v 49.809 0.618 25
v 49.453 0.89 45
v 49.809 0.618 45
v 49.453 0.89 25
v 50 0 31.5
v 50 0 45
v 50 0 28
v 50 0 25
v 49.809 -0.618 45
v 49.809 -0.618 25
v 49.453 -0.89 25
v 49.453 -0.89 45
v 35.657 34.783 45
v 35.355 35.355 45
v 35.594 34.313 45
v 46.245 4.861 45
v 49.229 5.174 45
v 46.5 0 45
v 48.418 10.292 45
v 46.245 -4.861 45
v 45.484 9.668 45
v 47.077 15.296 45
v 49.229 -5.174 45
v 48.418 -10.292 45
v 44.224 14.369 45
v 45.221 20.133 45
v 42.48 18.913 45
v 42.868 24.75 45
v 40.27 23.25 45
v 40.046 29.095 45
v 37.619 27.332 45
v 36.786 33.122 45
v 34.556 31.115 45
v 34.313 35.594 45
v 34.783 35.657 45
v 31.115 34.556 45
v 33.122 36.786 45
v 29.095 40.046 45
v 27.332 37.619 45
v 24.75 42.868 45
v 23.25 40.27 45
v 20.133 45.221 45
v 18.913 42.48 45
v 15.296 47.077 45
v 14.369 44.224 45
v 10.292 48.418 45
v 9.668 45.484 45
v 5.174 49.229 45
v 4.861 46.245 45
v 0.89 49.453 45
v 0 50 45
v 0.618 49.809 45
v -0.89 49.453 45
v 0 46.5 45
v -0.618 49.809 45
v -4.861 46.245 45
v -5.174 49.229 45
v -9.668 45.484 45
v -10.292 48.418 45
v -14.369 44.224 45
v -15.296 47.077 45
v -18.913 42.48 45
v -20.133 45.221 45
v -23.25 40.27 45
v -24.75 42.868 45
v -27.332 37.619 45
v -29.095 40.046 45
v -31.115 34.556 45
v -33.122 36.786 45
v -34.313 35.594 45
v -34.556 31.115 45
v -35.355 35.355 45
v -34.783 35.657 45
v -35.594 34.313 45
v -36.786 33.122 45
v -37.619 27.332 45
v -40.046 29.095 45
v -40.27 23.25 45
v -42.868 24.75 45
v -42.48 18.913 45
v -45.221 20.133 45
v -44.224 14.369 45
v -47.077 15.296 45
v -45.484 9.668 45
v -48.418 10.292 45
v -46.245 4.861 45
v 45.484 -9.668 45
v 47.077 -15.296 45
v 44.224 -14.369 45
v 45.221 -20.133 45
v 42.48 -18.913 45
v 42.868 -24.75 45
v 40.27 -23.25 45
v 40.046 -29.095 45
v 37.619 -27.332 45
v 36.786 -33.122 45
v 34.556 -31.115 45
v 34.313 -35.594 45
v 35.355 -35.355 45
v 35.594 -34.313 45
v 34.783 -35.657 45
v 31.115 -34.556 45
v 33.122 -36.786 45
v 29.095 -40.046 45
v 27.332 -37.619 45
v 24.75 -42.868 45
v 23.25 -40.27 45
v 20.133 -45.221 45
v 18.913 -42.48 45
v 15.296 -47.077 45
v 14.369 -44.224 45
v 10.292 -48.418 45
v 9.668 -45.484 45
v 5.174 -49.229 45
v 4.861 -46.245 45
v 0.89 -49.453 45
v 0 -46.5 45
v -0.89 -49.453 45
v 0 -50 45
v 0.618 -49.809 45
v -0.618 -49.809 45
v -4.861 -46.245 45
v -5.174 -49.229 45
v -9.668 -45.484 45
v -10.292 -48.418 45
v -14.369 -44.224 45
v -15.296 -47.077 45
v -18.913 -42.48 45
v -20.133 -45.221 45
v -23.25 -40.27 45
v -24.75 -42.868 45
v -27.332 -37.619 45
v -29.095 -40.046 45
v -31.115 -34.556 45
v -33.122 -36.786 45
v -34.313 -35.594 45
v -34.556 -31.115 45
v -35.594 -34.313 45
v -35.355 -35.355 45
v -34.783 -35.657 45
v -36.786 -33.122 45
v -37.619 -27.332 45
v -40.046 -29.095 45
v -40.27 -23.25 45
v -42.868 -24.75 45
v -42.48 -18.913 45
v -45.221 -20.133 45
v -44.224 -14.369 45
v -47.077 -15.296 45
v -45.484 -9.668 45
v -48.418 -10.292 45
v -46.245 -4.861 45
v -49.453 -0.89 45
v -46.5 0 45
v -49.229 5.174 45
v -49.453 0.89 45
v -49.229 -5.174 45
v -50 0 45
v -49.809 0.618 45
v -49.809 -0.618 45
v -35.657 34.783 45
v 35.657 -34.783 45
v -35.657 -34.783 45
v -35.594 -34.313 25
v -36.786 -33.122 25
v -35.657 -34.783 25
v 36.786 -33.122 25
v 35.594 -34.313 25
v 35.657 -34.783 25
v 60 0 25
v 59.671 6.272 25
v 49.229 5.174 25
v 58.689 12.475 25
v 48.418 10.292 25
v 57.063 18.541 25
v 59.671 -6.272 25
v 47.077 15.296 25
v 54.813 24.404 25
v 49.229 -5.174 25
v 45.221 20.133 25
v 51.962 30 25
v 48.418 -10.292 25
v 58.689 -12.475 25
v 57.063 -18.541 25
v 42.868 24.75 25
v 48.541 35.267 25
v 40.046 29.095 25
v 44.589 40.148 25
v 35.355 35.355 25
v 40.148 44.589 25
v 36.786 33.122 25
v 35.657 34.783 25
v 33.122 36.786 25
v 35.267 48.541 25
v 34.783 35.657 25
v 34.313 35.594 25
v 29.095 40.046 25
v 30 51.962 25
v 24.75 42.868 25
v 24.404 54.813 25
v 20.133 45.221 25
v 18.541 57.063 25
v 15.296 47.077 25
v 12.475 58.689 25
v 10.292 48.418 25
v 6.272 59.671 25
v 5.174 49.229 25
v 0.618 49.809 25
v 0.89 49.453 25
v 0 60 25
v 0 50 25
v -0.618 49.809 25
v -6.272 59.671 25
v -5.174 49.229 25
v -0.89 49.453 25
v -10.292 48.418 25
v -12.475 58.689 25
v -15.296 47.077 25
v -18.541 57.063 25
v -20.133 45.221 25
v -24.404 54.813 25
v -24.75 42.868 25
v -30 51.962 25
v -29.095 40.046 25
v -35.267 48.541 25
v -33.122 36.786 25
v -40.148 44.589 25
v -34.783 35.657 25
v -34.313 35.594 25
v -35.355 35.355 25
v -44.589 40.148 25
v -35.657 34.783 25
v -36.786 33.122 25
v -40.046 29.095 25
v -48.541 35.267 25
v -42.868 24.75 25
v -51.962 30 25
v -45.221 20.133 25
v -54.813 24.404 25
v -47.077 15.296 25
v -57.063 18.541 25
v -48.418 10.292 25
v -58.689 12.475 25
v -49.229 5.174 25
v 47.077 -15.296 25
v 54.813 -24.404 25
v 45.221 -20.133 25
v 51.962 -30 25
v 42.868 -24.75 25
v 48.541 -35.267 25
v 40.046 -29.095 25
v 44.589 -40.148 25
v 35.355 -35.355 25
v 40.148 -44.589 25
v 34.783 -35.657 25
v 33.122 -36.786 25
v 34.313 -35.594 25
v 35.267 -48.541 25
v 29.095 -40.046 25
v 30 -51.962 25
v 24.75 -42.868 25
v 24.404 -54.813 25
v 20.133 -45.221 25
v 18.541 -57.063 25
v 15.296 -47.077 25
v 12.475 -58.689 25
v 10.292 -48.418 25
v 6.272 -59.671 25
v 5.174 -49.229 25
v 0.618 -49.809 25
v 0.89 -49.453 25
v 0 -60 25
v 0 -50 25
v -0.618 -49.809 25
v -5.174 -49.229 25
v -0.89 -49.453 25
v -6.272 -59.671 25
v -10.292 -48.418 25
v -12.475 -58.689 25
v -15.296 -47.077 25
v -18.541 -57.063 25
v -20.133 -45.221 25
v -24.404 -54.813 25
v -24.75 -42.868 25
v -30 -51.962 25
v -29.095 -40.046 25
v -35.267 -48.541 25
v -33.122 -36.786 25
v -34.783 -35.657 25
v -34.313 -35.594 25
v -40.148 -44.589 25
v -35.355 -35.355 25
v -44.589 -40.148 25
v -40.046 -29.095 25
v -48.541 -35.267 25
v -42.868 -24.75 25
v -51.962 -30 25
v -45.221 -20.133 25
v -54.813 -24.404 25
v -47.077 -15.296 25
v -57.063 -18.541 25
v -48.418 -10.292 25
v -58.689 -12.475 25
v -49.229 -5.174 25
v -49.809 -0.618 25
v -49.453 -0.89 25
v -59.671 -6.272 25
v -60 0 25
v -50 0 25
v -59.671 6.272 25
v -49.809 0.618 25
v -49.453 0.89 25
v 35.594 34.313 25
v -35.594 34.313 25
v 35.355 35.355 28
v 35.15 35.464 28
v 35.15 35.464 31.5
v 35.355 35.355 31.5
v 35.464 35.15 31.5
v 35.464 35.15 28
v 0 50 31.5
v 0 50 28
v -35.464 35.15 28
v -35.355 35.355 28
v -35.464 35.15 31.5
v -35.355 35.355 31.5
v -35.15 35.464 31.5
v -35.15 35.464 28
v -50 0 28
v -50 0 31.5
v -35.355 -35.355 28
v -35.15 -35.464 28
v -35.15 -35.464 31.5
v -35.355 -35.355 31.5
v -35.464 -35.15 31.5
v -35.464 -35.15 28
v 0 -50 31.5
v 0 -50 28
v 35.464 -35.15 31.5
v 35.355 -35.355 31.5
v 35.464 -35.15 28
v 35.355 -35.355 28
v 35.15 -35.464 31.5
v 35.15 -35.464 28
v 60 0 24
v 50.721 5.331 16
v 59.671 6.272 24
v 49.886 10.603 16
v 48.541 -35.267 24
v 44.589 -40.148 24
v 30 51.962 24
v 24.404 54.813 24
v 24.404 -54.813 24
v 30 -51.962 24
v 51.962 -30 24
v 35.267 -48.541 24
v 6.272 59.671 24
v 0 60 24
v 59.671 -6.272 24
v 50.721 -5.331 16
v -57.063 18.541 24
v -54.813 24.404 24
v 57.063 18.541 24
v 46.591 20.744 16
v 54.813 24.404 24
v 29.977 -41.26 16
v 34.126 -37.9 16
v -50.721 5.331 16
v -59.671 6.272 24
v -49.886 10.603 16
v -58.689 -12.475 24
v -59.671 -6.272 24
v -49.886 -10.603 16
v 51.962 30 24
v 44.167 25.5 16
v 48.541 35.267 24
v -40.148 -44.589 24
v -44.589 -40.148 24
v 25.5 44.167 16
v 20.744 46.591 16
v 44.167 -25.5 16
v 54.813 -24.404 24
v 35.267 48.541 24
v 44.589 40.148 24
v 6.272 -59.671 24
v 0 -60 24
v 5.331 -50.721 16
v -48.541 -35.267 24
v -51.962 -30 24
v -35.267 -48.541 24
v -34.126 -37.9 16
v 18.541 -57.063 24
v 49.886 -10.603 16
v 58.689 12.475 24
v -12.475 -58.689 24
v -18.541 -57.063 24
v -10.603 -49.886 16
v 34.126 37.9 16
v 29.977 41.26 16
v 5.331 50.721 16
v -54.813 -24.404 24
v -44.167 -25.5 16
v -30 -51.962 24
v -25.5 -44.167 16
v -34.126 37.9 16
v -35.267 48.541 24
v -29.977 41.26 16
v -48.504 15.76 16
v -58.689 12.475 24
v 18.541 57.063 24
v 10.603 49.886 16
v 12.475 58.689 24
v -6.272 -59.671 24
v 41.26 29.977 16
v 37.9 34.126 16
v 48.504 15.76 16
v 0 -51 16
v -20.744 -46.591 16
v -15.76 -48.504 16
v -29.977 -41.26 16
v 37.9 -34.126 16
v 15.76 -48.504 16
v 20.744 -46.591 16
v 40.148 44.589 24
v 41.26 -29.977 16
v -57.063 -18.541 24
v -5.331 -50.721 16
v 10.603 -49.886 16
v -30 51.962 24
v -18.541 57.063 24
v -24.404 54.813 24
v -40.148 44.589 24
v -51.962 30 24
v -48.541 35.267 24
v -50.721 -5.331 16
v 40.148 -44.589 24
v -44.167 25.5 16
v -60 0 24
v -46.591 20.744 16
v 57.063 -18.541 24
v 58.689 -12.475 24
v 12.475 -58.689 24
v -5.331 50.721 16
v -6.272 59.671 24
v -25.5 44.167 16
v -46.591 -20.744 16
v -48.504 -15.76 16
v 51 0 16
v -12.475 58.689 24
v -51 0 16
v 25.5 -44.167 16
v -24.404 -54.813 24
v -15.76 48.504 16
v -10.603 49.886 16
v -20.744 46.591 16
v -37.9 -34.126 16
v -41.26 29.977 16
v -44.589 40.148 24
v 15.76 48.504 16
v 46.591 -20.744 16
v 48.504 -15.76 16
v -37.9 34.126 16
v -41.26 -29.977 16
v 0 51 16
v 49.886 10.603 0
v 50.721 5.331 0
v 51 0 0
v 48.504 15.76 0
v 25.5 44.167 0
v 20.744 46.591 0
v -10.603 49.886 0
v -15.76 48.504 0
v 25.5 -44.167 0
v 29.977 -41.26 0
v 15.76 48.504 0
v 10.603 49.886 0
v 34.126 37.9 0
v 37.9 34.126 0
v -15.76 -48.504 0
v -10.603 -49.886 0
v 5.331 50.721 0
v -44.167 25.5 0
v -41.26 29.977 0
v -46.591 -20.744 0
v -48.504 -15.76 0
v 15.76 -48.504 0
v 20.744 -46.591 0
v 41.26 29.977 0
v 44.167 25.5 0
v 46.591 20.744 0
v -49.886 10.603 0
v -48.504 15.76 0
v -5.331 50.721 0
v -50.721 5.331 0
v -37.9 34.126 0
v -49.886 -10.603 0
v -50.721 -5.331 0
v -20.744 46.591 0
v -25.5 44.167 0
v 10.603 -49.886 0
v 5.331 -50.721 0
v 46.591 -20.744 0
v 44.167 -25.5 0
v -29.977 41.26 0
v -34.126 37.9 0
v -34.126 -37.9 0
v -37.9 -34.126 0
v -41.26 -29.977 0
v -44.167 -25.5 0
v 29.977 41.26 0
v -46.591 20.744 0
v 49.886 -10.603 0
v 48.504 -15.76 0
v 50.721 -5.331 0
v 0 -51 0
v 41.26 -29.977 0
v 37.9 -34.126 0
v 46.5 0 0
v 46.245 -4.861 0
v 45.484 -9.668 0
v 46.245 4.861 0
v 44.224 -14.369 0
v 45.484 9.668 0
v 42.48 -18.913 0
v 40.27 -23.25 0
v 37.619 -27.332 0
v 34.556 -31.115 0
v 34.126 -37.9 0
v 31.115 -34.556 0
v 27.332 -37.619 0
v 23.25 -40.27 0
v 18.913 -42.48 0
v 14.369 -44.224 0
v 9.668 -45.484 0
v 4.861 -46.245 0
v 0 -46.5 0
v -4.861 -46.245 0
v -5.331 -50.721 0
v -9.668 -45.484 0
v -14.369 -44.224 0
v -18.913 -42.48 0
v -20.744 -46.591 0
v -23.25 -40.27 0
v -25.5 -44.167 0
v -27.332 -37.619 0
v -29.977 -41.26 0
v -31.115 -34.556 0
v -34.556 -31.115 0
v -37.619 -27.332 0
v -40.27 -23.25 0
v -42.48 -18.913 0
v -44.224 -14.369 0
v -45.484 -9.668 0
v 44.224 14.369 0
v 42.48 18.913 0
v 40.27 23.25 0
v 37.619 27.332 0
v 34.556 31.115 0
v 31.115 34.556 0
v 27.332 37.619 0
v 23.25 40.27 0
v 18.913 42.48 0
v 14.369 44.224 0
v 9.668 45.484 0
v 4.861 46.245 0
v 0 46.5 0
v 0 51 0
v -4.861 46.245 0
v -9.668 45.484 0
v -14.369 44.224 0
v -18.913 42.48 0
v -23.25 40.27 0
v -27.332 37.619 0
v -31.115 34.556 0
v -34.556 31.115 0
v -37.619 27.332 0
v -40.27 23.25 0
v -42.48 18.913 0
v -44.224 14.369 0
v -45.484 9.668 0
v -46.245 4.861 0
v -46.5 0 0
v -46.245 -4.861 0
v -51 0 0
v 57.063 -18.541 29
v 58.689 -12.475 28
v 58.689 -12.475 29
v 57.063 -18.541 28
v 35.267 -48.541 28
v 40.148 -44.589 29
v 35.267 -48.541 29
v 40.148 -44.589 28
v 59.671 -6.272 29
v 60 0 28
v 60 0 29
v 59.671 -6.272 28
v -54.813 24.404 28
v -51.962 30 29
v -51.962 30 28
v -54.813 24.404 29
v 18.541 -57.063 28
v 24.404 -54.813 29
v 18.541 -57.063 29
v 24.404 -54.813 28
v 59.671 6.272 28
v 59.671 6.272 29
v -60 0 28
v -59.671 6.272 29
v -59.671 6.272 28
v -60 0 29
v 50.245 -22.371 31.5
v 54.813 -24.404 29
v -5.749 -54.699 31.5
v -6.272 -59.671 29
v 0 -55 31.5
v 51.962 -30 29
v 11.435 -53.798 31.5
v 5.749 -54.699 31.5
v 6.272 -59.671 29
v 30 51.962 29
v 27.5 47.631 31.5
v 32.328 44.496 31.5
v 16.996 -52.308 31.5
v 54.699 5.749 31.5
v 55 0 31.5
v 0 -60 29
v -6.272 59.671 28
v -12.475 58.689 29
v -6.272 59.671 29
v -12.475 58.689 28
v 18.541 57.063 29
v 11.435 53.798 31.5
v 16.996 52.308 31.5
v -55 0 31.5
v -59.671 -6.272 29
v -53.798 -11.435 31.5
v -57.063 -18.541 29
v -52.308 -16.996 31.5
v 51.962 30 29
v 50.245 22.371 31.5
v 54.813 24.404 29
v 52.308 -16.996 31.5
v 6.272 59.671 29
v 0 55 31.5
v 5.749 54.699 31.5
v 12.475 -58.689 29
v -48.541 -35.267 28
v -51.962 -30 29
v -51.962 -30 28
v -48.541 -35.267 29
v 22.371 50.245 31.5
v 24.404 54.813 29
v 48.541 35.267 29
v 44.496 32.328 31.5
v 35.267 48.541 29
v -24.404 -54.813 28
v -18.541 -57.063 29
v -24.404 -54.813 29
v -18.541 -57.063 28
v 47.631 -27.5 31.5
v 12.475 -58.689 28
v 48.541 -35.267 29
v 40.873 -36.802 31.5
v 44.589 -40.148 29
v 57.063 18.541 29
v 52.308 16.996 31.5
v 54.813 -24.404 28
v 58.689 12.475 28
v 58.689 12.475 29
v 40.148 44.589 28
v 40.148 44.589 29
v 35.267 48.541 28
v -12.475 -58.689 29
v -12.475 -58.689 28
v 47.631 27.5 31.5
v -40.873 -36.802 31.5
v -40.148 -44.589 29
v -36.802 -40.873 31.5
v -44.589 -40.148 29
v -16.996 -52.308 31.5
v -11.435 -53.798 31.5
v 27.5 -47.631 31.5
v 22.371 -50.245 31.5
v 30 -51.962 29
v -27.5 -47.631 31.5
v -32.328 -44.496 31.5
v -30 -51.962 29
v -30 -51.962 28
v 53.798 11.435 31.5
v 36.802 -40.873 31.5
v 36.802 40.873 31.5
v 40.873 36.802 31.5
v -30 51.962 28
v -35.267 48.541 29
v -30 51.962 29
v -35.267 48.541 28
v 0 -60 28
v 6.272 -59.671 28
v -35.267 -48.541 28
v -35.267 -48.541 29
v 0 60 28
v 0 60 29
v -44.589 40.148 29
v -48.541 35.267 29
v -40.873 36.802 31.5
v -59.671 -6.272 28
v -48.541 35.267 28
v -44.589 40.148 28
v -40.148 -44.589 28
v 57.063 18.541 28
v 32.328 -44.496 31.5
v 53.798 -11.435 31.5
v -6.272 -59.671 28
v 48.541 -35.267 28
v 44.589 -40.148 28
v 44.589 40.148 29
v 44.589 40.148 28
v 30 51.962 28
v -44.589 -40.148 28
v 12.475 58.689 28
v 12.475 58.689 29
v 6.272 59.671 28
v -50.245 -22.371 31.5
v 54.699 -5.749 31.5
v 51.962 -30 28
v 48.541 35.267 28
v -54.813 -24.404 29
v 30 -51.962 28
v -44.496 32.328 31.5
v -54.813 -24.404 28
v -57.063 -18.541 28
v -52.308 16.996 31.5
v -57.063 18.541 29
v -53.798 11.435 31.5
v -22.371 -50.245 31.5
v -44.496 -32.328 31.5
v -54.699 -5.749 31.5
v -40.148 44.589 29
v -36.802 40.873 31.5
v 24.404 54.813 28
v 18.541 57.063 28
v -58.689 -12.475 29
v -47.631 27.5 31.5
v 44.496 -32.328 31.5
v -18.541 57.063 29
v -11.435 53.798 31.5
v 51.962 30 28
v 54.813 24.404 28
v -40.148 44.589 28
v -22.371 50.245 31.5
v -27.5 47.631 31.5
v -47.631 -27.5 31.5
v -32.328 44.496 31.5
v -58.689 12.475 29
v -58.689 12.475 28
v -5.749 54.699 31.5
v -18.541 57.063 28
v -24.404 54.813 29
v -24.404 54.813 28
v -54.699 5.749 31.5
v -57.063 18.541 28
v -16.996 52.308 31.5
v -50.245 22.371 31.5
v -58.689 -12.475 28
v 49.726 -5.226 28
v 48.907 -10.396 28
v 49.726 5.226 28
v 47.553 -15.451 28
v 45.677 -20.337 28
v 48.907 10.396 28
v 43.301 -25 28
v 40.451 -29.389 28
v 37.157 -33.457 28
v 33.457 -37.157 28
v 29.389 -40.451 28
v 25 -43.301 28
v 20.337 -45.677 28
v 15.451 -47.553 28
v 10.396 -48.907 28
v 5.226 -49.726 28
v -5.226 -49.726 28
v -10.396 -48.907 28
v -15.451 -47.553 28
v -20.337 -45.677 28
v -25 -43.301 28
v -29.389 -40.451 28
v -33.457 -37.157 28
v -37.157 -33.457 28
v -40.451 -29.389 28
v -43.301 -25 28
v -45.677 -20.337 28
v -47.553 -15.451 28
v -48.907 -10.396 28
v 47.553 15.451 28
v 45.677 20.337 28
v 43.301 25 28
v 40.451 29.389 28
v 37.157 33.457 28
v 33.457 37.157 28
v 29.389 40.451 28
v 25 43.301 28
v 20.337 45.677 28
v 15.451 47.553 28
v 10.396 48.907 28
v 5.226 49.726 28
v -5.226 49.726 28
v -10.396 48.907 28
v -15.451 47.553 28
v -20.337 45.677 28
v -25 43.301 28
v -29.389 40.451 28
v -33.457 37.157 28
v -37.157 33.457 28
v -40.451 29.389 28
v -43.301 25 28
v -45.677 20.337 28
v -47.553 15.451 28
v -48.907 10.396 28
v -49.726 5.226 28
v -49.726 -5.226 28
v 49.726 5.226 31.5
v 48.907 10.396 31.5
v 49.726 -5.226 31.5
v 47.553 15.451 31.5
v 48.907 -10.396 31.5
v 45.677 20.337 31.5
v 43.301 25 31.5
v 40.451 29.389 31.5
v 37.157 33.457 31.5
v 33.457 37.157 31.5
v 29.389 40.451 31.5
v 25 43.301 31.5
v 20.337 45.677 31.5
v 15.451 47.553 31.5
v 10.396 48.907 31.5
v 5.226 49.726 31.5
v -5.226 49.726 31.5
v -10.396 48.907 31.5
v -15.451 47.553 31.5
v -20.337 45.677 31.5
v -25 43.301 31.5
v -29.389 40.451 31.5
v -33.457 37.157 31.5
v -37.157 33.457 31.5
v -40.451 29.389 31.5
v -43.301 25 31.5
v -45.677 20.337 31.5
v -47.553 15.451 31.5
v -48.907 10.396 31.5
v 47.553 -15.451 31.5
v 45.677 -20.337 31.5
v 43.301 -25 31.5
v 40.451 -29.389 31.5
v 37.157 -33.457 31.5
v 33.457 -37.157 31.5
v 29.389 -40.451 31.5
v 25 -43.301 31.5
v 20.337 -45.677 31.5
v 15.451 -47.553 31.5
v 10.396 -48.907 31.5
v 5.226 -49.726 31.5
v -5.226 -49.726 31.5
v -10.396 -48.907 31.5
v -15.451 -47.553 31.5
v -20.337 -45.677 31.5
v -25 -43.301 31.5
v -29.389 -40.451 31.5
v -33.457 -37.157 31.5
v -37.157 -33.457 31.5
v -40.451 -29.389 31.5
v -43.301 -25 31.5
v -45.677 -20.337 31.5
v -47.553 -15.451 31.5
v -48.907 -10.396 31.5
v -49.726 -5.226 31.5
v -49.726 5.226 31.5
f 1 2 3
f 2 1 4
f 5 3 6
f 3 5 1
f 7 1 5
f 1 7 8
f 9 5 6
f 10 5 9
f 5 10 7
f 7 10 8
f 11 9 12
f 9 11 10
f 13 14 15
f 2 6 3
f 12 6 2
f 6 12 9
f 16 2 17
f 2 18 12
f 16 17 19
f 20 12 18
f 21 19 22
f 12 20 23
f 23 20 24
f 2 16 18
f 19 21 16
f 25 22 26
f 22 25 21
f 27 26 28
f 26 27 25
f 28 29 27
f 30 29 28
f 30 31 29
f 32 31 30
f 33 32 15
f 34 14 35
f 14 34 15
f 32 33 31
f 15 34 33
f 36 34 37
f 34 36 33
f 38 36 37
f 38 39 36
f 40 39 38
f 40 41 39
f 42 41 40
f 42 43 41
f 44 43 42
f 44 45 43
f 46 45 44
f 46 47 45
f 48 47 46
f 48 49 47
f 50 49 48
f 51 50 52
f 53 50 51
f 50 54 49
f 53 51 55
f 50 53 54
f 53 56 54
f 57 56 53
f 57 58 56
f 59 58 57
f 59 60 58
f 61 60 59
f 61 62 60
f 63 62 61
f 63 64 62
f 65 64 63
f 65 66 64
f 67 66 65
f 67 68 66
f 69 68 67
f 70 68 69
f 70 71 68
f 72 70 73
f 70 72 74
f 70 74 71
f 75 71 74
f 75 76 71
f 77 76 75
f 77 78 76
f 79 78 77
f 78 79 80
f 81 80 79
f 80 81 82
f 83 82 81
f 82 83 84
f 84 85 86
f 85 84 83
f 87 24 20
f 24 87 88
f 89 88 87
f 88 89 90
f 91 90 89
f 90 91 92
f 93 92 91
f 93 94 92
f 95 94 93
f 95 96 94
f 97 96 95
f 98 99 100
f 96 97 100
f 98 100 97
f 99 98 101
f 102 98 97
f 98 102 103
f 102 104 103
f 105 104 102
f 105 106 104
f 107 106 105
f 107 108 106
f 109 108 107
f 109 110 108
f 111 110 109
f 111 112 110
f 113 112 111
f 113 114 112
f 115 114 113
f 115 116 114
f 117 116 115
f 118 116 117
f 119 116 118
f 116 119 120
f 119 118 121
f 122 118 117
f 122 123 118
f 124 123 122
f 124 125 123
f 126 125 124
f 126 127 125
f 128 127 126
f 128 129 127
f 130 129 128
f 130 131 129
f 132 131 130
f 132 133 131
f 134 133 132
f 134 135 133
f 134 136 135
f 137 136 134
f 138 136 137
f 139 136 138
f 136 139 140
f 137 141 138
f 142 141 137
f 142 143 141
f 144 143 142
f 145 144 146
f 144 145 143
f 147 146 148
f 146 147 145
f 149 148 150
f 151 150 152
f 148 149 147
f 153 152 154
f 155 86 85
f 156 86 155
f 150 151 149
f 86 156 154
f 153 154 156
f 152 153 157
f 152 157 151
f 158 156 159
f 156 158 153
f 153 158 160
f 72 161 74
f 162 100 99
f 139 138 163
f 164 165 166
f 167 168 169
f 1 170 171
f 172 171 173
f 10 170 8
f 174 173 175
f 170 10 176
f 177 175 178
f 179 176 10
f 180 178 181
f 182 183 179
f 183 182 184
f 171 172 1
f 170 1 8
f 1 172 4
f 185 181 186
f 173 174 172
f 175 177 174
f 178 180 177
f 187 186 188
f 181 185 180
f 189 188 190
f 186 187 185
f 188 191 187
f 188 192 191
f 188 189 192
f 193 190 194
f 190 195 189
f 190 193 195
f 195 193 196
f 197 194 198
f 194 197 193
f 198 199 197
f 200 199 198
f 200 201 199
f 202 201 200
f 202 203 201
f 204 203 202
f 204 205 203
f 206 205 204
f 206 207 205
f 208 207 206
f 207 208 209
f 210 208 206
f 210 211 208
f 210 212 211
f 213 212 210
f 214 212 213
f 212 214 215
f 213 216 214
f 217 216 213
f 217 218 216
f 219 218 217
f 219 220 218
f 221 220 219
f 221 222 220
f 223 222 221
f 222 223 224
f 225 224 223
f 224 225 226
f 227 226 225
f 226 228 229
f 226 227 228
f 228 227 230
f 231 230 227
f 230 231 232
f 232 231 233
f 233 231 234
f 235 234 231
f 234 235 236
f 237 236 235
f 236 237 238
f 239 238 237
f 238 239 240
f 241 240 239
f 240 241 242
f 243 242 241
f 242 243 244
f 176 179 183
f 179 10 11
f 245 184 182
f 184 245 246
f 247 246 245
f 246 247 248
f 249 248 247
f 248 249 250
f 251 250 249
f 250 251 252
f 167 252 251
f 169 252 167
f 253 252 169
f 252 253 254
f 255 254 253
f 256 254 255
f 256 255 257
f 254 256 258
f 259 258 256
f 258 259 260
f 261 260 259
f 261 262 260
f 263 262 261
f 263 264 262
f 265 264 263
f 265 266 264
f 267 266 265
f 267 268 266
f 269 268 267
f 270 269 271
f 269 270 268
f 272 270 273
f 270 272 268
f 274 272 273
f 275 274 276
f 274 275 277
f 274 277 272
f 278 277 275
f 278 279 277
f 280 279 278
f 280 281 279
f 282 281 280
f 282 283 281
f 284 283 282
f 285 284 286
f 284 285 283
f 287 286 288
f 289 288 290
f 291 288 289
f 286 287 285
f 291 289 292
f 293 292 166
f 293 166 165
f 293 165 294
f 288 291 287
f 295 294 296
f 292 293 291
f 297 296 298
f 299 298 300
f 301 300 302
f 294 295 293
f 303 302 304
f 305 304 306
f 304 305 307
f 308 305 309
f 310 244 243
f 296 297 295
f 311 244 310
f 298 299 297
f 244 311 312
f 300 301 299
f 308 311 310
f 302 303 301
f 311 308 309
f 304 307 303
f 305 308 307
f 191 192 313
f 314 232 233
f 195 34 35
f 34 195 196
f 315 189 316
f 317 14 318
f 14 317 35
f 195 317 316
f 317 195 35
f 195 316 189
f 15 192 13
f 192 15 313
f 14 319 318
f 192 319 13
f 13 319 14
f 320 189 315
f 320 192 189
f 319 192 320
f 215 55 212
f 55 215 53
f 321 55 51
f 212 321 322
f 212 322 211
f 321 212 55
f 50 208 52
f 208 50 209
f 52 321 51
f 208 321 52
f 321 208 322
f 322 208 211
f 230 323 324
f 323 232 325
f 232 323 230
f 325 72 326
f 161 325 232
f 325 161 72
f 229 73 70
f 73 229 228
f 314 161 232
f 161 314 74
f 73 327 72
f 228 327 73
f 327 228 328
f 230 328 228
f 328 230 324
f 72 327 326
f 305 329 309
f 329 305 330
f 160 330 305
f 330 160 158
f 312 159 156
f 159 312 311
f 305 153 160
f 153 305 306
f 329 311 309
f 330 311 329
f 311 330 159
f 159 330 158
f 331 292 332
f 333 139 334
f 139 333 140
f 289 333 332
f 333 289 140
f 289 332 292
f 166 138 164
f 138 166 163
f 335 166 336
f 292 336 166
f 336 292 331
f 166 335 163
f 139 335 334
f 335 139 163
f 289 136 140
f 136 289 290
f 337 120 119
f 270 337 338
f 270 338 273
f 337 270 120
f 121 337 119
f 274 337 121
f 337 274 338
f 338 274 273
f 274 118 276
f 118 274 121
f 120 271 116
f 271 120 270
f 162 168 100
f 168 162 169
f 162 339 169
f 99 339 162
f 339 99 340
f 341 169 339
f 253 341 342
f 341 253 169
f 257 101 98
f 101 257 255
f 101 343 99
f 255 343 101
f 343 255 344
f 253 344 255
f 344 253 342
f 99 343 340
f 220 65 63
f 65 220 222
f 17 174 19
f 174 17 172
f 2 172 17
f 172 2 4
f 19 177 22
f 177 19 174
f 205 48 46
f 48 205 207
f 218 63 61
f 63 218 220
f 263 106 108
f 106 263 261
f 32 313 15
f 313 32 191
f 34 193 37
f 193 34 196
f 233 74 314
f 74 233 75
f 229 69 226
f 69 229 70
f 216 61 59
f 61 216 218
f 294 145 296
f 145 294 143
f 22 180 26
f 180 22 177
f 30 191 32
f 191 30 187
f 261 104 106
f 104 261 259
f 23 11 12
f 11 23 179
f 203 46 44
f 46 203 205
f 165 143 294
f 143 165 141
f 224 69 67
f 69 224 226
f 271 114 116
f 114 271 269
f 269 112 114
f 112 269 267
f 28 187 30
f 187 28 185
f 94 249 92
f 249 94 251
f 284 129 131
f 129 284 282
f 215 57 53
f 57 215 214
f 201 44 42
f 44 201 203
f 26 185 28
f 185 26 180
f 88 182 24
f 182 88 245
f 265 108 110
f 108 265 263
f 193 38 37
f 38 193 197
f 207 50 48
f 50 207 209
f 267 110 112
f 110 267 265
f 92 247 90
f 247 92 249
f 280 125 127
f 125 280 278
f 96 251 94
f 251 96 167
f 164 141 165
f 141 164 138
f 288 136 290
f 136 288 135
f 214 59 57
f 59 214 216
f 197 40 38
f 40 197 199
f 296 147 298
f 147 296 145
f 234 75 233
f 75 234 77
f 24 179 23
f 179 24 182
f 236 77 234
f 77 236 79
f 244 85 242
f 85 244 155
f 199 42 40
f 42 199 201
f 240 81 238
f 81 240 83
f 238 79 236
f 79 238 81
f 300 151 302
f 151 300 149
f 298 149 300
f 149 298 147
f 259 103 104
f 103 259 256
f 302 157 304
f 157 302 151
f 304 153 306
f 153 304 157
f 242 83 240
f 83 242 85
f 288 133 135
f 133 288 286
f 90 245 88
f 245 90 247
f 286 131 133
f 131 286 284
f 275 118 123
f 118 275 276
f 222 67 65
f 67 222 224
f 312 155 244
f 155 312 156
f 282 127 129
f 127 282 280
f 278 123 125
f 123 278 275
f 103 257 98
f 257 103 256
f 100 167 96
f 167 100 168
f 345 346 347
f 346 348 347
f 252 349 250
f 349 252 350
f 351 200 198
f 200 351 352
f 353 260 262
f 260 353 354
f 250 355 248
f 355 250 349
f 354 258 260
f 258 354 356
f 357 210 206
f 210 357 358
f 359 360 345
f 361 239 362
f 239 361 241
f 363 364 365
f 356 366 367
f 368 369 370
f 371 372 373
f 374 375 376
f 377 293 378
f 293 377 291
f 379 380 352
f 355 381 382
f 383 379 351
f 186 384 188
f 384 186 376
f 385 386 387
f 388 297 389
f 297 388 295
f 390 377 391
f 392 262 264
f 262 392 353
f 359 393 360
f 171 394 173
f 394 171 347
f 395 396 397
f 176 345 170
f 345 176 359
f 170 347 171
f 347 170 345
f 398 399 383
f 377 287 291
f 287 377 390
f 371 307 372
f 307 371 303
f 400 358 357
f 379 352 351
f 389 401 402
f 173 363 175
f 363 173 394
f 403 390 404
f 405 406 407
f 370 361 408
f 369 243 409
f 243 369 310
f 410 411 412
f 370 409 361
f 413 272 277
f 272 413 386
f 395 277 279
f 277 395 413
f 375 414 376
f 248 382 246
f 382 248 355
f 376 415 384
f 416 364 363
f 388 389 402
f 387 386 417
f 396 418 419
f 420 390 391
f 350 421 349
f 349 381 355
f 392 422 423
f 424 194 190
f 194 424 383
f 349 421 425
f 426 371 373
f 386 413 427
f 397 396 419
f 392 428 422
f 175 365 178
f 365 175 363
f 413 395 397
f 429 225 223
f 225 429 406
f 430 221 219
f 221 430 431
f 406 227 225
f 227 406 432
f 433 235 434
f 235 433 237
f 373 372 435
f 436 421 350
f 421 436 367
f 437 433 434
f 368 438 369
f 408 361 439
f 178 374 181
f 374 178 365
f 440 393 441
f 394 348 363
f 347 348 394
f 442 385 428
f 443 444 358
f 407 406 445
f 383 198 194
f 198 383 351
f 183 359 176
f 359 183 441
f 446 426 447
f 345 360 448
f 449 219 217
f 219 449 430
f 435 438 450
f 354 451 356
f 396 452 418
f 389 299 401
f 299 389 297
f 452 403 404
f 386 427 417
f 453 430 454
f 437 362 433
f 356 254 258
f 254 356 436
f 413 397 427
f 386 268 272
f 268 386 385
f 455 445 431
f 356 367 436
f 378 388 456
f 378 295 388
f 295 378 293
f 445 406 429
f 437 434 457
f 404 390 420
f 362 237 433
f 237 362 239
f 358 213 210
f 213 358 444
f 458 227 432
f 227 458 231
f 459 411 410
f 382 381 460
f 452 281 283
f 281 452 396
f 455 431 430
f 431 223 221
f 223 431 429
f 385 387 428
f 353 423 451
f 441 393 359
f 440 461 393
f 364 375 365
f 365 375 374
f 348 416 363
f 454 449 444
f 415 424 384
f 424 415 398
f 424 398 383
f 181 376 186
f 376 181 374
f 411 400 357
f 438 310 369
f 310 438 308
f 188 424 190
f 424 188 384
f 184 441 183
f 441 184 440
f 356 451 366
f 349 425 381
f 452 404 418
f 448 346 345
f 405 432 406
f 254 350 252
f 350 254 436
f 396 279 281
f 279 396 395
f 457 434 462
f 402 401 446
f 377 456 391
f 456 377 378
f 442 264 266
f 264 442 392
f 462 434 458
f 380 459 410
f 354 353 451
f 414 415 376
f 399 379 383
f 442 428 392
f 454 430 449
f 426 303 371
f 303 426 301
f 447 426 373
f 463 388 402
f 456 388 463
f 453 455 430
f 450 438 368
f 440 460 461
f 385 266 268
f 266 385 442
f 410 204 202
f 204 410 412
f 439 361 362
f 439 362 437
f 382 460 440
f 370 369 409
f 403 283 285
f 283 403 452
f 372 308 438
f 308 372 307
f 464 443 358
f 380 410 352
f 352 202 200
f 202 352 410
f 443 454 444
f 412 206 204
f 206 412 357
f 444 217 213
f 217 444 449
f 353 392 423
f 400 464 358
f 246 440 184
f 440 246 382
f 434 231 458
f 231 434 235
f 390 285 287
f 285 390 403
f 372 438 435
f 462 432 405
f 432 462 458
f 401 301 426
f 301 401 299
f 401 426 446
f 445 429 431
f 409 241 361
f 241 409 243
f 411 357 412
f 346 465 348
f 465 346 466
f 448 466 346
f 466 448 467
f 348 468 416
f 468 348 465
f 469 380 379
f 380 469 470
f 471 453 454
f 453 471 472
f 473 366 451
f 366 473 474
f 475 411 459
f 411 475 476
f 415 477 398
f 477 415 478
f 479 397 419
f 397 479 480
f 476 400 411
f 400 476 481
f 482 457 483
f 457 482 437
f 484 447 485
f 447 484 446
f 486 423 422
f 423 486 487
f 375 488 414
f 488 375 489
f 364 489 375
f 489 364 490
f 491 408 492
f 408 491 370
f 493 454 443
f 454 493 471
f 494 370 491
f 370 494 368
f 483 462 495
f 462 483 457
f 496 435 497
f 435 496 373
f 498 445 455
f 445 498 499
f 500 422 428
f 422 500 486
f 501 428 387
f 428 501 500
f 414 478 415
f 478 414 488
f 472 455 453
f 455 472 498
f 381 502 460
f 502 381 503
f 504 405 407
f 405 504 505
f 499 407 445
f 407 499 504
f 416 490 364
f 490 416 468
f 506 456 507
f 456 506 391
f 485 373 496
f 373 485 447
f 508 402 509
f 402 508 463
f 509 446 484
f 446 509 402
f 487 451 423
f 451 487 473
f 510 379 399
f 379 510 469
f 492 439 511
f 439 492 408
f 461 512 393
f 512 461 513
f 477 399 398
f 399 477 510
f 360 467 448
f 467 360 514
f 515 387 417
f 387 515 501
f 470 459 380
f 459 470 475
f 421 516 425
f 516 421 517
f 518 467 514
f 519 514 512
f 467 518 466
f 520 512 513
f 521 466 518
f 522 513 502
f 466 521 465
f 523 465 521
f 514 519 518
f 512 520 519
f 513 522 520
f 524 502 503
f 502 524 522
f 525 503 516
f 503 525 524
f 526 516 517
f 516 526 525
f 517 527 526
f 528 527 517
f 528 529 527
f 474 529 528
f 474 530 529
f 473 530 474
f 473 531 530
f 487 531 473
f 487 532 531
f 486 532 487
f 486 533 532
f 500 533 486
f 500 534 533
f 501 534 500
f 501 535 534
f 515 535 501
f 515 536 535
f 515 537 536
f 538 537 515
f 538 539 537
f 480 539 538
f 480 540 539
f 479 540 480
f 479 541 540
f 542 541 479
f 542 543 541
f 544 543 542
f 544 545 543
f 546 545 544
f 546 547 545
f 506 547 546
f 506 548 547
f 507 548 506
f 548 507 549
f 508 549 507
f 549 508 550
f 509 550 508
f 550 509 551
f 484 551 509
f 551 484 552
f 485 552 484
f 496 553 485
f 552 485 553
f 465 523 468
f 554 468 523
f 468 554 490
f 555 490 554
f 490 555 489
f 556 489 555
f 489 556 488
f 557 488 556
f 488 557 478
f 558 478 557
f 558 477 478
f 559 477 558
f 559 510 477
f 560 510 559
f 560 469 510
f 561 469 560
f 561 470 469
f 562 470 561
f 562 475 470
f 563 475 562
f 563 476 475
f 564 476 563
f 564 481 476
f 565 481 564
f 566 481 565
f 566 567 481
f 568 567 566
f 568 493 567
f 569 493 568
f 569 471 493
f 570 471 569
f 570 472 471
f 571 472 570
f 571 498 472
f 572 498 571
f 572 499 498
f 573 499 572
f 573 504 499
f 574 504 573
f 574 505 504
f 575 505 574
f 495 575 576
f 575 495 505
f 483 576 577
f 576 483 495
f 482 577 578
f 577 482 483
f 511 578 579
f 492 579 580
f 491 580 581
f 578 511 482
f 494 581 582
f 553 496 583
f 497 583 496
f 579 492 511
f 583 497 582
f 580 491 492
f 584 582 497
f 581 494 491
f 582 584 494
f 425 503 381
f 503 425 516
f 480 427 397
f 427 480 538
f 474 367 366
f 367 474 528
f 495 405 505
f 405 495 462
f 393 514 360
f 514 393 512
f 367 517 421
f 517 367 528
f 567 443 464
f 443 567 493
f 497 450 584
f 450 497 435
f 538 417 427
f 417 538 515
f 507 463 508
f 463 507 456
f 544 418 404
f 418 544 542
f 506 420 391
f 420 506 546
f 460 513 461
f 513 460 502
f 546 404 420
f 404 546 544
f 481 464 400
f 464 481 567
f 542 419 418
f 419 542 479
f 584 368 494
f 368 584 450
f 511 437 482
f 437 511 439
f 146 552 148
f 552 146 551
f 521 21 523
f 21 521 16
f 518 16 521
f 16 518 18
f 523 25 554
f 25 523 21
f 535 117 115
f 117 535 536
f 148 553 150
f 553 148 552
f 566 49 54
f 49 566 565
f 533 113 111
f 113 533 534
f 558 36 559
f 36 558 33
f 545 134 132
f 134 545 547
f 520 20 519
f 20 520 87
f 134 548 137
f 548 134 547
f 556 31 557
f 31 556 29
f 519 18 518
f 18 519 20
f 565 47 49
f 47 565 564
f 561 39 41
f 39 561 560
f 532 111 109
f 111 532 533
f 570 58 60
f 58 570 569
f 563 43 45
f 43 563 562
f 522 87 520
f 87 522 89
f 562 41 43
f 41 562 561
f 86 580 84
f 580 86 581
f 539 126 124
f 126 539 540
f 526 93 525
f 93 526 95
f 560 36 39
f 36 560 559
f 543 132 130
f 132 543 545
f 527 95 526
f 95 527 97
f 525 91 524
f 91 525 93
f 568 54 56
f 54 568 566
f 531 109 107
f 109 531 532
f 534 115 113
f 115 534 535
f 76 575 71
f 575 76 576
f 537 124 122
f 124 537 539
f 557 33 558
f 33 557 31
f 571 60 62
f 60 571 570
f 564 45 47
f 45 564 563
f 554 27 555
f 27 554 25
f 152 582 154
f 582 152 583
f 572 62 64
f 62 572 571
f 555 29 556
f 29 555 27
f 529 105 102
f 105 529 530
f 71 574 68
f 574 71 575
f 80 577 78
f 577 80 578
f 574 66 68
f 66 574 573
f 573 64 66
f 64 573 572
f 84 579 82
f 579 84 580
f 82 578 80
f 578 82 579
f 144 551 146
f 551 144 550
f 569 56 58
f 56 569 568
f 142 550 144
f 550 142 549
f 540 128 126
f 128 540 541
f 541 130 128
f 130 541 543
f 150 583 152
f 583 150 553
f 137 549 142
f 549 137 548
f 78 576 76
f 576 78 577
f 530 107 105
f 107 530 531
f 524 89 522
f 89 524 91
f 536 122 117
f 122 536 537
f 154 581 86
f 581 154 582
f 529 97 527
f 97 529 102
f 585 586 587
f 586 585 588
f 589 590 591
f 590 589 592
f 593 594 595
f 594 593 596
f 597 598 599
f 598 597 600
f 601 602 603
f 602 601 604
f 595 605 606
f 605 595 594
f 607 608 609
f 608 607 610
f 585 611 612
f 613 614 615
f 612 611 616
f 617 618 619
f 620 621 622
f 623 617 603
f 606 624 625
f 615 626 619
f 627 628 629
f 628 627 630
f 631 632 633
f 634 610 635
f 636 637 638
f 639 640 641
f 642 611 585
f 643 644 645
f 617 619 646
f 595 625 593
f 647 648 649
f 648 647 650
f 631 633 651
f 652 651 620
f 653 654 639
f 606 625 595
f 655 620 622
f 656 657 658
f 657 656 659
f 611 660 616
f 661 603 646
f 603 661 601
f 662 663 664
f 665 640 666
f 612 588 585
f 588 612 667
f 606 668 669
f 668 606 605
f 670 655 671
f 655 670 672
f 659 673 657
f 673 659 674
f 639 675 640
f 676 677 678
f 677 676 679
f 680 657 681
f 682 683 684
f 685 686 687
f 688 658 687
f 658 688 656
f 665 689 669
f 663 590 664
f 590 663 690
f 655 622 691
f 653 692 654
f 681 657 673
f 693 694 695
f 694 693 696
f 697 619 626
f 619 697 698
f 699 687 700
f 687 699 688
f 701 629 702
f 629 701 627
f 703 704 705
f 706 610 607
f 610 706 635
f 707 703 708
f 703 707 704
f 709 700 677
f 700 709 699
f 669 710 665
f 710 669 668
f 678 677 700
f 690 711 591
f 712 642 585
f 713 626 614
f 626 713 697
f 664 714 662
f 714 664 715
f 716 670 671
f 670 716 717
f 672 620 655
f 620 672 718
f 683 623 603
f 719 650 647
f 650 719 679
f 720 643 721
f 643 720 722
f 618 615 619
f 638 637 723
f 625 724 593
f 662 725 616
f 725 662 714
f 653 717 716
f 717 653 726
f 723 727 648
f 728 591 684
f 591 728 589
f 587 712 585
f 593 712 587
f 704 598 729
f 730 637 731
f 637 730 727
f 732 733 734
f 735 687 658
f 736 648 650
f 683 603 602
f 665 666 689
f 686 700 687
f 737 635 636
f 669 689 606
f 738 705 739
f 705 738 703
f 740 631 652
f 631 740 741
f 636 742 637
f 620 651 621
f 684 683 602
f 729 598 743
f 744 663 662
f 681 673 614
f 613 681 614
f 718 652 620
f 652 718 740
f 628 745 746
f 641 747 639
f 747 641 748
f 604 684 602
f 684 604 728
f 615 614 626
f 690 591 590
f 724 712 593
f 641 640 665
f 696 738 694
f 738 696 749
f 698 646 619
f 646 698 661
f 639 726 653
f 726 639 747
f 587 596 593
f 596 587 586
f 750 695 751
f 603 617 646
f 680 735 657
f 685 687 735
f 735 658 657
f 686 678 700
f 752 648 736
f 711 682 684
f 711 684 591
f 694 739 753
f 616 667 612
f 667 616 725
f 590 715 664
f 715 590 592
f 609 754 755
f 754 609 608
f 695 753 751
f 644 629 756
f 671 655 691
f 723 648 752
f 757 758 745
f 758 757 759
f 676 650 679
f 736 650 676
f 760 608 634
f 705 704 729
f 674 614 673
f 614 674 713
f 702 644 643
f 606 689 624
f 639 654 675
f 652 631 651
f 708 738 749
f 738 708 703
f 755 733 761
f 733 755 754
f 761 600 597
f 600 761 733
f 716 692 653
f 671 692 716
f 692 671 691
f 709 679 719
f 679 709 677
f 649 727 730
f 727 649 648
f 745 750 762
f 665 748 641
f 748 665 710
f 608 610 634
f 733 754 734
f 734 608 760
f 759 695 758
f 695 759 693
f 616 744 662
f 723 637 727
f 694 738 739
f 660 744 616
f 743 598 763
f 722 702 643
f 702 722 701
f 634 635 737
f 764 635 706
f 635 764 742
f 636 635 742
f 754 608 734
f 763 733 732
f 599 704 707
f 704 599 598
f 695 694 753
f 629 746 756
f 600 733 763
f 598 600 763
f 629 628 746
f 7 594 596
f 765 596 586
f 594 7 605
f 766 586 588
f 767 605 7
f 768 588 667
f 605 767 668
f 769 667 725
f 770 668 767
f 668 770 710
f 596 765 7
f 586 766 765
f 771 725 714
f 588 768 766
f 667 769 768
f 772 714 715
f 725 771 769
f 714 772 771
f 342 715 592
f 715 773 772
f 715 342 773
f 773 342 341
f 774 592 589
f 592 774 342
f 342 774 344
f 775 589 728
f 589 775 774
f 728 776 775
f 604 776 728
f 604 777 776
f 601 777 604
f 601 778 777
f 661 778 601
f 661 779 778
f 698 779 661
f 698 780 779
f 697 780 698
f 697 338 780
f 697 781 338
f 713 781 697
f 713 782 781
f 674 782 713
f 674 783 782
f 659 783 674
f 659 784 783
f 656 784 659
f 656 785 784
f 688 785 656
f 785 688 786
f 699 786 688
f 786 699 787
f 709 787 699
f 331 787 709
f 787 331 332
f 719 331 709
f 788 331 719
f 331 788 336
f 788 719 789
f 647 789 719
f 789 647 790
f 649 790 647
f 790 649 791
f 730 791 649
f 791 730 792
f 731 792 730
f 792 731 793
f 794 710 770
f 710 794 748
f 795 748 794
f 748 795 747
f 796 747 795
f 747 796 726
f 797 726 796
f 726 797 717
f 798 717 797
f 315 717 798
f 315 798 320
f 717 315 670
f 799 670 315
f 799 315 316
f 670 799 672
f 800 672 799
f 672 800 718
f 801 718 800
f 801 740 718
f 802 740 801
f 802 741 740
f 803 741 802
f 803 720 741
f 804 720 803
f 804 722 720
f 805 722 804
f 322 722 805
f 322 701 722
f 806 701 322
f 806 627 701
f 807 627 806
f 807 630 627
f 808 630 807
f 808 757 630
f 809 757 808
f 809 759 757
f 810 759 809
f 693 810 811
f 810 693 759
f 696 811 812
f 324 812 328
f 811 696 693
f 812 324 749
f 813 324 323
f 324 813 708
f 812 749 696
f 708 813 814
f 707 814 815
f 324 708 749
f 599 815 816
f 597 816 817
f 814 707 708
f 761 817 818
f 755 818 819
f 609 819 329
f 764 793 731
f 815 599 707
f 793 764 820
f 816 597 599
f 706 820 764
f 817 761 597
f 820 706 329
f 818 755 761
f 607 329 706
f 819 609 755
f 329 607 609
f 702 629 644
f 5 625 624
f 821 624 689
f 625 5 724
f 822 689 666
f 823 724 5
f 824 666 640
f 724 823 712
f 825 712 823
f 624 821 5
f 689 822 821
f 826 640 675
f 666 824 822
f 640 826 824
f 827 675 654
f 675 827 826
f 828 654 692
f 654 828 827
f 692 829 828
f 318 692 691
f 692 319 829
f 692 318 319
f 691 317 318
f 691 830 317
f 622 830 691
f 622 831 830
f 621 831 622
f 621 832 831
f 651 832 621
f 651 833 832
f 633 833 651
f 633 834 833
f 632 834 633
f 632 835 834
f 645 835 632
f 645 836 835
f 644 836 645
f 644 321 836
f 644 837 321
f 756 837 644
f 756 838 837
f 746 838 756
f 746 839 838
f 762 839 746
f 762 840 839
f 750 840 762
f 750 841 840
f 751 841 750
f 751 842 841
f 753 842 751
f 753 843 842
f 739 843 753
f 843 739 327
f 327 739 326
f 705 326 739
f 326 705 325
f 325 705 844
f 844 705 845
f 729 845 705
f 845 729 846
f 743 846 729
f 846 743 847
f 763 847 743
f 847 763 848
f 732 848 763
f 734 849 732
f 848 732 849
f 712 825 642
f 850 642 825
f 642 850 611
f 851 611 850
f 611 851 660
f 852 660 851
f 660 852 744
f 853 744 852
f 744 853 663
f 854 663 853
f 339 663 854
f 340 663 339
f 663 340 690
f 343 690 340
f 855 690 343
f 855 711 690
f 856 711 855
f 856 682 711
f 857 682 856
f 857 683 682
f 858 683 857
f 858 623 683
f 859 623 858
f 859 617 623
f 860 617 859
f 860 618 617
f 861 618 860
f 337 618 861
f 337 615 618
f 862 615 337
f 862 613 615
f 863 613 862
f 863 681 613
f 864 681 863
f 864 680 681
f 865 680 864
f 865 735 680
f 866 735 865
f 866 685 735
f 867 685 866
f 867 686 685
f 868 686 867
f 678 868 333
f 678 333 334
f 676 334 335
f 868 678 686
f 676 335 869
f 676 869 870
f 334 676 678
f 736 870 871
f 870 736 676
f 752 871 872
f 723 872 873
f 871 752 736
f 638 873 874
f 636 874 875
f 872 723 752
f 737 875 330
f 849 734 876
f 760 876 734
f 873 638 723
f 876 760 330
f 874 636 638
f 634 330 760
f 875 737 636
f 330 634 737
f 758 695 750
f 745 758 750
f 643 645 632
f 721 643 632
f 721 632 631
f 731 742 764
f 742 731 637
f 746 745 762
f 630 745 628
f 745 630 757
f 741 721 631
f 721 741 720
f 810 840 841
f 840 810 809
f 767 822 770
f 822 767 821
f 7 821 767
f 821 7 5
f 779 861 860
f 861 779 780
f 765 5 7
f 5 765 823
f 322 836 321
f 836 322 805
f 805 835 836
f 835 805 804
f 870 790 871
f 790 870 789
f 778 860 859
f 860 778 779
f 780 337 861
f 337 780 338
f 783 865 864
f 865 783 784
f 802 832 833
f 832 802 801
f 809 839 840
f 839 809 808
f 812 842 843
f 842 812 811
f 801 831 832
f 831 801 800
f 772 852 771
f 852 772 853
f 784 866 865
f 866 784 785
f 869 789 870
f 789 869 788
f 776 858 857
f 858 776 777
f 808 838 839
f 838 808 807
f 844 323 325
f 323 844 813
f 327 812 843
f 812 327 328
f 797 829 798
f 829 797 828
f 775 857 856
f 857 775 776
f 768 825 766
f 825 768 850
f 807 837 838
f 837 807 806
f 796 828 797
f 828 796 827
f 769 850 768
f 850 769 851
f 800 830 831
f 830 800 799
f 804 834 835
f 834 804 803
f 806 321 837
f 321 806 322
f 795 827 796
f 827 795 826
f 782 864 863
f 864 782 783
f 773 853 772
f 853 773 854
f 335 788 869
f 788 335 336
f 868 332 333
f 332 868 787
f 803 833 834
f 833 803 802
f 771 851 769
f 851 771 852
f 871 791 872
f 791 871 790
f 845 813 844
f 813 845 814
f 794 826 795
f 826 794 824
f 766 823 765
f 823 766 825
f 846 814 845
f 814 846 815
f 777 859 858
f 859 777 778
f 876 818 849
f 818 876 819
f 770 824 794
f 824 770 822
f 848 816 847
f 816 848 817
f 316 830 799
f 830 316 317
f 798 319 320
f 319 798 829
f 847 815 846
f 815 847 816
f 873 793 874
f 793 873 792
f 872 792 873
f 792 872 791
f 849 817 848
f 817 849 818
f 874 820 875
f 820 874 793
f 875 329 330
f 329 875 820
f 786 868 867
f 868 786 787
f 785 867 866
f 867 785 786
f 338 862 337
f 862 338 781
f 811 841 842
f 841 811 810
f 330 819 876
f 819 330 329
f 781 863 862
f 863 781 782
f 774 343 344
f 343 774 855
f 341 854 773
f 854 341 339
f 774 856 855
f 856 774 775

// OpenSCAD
include <../../lib/relativity.scad/relativity.scad>

$fn=60;

module A() {
  differed("hole", "not(hole)") {
    rod(d=102, h=16, anchor=bottom)
    hulled("hulled")
    align(top)
    rod(d=102, h=8, anchor=bottom, $class="hulled")
    align(top)
    rod(d=120, h=1, anchor=bottom, $class="hulled")
    align(top)
    rod(d=99, h=20, anchor=bottom, $class="normal")
    align(top)
    rotated(45*z, n=[0:7]) translated(49*x) rod(d=2, h=20, anchor=top, $fn=10)
    ;

    rod(d=93, h=100, $class="hole");
  }
}

module B() {
  differed("hole", "not(hole)") 
  hulled("hulled")
  rod(d=120, h=1, anchor=bottom, $class="hulled")
  rod(d=110, h=3, anchor=bottom, $class="hulled")
  rod(d=100, h=5, $class="hole")
  ;
}

A();
translated(28*z) color("red") B();
